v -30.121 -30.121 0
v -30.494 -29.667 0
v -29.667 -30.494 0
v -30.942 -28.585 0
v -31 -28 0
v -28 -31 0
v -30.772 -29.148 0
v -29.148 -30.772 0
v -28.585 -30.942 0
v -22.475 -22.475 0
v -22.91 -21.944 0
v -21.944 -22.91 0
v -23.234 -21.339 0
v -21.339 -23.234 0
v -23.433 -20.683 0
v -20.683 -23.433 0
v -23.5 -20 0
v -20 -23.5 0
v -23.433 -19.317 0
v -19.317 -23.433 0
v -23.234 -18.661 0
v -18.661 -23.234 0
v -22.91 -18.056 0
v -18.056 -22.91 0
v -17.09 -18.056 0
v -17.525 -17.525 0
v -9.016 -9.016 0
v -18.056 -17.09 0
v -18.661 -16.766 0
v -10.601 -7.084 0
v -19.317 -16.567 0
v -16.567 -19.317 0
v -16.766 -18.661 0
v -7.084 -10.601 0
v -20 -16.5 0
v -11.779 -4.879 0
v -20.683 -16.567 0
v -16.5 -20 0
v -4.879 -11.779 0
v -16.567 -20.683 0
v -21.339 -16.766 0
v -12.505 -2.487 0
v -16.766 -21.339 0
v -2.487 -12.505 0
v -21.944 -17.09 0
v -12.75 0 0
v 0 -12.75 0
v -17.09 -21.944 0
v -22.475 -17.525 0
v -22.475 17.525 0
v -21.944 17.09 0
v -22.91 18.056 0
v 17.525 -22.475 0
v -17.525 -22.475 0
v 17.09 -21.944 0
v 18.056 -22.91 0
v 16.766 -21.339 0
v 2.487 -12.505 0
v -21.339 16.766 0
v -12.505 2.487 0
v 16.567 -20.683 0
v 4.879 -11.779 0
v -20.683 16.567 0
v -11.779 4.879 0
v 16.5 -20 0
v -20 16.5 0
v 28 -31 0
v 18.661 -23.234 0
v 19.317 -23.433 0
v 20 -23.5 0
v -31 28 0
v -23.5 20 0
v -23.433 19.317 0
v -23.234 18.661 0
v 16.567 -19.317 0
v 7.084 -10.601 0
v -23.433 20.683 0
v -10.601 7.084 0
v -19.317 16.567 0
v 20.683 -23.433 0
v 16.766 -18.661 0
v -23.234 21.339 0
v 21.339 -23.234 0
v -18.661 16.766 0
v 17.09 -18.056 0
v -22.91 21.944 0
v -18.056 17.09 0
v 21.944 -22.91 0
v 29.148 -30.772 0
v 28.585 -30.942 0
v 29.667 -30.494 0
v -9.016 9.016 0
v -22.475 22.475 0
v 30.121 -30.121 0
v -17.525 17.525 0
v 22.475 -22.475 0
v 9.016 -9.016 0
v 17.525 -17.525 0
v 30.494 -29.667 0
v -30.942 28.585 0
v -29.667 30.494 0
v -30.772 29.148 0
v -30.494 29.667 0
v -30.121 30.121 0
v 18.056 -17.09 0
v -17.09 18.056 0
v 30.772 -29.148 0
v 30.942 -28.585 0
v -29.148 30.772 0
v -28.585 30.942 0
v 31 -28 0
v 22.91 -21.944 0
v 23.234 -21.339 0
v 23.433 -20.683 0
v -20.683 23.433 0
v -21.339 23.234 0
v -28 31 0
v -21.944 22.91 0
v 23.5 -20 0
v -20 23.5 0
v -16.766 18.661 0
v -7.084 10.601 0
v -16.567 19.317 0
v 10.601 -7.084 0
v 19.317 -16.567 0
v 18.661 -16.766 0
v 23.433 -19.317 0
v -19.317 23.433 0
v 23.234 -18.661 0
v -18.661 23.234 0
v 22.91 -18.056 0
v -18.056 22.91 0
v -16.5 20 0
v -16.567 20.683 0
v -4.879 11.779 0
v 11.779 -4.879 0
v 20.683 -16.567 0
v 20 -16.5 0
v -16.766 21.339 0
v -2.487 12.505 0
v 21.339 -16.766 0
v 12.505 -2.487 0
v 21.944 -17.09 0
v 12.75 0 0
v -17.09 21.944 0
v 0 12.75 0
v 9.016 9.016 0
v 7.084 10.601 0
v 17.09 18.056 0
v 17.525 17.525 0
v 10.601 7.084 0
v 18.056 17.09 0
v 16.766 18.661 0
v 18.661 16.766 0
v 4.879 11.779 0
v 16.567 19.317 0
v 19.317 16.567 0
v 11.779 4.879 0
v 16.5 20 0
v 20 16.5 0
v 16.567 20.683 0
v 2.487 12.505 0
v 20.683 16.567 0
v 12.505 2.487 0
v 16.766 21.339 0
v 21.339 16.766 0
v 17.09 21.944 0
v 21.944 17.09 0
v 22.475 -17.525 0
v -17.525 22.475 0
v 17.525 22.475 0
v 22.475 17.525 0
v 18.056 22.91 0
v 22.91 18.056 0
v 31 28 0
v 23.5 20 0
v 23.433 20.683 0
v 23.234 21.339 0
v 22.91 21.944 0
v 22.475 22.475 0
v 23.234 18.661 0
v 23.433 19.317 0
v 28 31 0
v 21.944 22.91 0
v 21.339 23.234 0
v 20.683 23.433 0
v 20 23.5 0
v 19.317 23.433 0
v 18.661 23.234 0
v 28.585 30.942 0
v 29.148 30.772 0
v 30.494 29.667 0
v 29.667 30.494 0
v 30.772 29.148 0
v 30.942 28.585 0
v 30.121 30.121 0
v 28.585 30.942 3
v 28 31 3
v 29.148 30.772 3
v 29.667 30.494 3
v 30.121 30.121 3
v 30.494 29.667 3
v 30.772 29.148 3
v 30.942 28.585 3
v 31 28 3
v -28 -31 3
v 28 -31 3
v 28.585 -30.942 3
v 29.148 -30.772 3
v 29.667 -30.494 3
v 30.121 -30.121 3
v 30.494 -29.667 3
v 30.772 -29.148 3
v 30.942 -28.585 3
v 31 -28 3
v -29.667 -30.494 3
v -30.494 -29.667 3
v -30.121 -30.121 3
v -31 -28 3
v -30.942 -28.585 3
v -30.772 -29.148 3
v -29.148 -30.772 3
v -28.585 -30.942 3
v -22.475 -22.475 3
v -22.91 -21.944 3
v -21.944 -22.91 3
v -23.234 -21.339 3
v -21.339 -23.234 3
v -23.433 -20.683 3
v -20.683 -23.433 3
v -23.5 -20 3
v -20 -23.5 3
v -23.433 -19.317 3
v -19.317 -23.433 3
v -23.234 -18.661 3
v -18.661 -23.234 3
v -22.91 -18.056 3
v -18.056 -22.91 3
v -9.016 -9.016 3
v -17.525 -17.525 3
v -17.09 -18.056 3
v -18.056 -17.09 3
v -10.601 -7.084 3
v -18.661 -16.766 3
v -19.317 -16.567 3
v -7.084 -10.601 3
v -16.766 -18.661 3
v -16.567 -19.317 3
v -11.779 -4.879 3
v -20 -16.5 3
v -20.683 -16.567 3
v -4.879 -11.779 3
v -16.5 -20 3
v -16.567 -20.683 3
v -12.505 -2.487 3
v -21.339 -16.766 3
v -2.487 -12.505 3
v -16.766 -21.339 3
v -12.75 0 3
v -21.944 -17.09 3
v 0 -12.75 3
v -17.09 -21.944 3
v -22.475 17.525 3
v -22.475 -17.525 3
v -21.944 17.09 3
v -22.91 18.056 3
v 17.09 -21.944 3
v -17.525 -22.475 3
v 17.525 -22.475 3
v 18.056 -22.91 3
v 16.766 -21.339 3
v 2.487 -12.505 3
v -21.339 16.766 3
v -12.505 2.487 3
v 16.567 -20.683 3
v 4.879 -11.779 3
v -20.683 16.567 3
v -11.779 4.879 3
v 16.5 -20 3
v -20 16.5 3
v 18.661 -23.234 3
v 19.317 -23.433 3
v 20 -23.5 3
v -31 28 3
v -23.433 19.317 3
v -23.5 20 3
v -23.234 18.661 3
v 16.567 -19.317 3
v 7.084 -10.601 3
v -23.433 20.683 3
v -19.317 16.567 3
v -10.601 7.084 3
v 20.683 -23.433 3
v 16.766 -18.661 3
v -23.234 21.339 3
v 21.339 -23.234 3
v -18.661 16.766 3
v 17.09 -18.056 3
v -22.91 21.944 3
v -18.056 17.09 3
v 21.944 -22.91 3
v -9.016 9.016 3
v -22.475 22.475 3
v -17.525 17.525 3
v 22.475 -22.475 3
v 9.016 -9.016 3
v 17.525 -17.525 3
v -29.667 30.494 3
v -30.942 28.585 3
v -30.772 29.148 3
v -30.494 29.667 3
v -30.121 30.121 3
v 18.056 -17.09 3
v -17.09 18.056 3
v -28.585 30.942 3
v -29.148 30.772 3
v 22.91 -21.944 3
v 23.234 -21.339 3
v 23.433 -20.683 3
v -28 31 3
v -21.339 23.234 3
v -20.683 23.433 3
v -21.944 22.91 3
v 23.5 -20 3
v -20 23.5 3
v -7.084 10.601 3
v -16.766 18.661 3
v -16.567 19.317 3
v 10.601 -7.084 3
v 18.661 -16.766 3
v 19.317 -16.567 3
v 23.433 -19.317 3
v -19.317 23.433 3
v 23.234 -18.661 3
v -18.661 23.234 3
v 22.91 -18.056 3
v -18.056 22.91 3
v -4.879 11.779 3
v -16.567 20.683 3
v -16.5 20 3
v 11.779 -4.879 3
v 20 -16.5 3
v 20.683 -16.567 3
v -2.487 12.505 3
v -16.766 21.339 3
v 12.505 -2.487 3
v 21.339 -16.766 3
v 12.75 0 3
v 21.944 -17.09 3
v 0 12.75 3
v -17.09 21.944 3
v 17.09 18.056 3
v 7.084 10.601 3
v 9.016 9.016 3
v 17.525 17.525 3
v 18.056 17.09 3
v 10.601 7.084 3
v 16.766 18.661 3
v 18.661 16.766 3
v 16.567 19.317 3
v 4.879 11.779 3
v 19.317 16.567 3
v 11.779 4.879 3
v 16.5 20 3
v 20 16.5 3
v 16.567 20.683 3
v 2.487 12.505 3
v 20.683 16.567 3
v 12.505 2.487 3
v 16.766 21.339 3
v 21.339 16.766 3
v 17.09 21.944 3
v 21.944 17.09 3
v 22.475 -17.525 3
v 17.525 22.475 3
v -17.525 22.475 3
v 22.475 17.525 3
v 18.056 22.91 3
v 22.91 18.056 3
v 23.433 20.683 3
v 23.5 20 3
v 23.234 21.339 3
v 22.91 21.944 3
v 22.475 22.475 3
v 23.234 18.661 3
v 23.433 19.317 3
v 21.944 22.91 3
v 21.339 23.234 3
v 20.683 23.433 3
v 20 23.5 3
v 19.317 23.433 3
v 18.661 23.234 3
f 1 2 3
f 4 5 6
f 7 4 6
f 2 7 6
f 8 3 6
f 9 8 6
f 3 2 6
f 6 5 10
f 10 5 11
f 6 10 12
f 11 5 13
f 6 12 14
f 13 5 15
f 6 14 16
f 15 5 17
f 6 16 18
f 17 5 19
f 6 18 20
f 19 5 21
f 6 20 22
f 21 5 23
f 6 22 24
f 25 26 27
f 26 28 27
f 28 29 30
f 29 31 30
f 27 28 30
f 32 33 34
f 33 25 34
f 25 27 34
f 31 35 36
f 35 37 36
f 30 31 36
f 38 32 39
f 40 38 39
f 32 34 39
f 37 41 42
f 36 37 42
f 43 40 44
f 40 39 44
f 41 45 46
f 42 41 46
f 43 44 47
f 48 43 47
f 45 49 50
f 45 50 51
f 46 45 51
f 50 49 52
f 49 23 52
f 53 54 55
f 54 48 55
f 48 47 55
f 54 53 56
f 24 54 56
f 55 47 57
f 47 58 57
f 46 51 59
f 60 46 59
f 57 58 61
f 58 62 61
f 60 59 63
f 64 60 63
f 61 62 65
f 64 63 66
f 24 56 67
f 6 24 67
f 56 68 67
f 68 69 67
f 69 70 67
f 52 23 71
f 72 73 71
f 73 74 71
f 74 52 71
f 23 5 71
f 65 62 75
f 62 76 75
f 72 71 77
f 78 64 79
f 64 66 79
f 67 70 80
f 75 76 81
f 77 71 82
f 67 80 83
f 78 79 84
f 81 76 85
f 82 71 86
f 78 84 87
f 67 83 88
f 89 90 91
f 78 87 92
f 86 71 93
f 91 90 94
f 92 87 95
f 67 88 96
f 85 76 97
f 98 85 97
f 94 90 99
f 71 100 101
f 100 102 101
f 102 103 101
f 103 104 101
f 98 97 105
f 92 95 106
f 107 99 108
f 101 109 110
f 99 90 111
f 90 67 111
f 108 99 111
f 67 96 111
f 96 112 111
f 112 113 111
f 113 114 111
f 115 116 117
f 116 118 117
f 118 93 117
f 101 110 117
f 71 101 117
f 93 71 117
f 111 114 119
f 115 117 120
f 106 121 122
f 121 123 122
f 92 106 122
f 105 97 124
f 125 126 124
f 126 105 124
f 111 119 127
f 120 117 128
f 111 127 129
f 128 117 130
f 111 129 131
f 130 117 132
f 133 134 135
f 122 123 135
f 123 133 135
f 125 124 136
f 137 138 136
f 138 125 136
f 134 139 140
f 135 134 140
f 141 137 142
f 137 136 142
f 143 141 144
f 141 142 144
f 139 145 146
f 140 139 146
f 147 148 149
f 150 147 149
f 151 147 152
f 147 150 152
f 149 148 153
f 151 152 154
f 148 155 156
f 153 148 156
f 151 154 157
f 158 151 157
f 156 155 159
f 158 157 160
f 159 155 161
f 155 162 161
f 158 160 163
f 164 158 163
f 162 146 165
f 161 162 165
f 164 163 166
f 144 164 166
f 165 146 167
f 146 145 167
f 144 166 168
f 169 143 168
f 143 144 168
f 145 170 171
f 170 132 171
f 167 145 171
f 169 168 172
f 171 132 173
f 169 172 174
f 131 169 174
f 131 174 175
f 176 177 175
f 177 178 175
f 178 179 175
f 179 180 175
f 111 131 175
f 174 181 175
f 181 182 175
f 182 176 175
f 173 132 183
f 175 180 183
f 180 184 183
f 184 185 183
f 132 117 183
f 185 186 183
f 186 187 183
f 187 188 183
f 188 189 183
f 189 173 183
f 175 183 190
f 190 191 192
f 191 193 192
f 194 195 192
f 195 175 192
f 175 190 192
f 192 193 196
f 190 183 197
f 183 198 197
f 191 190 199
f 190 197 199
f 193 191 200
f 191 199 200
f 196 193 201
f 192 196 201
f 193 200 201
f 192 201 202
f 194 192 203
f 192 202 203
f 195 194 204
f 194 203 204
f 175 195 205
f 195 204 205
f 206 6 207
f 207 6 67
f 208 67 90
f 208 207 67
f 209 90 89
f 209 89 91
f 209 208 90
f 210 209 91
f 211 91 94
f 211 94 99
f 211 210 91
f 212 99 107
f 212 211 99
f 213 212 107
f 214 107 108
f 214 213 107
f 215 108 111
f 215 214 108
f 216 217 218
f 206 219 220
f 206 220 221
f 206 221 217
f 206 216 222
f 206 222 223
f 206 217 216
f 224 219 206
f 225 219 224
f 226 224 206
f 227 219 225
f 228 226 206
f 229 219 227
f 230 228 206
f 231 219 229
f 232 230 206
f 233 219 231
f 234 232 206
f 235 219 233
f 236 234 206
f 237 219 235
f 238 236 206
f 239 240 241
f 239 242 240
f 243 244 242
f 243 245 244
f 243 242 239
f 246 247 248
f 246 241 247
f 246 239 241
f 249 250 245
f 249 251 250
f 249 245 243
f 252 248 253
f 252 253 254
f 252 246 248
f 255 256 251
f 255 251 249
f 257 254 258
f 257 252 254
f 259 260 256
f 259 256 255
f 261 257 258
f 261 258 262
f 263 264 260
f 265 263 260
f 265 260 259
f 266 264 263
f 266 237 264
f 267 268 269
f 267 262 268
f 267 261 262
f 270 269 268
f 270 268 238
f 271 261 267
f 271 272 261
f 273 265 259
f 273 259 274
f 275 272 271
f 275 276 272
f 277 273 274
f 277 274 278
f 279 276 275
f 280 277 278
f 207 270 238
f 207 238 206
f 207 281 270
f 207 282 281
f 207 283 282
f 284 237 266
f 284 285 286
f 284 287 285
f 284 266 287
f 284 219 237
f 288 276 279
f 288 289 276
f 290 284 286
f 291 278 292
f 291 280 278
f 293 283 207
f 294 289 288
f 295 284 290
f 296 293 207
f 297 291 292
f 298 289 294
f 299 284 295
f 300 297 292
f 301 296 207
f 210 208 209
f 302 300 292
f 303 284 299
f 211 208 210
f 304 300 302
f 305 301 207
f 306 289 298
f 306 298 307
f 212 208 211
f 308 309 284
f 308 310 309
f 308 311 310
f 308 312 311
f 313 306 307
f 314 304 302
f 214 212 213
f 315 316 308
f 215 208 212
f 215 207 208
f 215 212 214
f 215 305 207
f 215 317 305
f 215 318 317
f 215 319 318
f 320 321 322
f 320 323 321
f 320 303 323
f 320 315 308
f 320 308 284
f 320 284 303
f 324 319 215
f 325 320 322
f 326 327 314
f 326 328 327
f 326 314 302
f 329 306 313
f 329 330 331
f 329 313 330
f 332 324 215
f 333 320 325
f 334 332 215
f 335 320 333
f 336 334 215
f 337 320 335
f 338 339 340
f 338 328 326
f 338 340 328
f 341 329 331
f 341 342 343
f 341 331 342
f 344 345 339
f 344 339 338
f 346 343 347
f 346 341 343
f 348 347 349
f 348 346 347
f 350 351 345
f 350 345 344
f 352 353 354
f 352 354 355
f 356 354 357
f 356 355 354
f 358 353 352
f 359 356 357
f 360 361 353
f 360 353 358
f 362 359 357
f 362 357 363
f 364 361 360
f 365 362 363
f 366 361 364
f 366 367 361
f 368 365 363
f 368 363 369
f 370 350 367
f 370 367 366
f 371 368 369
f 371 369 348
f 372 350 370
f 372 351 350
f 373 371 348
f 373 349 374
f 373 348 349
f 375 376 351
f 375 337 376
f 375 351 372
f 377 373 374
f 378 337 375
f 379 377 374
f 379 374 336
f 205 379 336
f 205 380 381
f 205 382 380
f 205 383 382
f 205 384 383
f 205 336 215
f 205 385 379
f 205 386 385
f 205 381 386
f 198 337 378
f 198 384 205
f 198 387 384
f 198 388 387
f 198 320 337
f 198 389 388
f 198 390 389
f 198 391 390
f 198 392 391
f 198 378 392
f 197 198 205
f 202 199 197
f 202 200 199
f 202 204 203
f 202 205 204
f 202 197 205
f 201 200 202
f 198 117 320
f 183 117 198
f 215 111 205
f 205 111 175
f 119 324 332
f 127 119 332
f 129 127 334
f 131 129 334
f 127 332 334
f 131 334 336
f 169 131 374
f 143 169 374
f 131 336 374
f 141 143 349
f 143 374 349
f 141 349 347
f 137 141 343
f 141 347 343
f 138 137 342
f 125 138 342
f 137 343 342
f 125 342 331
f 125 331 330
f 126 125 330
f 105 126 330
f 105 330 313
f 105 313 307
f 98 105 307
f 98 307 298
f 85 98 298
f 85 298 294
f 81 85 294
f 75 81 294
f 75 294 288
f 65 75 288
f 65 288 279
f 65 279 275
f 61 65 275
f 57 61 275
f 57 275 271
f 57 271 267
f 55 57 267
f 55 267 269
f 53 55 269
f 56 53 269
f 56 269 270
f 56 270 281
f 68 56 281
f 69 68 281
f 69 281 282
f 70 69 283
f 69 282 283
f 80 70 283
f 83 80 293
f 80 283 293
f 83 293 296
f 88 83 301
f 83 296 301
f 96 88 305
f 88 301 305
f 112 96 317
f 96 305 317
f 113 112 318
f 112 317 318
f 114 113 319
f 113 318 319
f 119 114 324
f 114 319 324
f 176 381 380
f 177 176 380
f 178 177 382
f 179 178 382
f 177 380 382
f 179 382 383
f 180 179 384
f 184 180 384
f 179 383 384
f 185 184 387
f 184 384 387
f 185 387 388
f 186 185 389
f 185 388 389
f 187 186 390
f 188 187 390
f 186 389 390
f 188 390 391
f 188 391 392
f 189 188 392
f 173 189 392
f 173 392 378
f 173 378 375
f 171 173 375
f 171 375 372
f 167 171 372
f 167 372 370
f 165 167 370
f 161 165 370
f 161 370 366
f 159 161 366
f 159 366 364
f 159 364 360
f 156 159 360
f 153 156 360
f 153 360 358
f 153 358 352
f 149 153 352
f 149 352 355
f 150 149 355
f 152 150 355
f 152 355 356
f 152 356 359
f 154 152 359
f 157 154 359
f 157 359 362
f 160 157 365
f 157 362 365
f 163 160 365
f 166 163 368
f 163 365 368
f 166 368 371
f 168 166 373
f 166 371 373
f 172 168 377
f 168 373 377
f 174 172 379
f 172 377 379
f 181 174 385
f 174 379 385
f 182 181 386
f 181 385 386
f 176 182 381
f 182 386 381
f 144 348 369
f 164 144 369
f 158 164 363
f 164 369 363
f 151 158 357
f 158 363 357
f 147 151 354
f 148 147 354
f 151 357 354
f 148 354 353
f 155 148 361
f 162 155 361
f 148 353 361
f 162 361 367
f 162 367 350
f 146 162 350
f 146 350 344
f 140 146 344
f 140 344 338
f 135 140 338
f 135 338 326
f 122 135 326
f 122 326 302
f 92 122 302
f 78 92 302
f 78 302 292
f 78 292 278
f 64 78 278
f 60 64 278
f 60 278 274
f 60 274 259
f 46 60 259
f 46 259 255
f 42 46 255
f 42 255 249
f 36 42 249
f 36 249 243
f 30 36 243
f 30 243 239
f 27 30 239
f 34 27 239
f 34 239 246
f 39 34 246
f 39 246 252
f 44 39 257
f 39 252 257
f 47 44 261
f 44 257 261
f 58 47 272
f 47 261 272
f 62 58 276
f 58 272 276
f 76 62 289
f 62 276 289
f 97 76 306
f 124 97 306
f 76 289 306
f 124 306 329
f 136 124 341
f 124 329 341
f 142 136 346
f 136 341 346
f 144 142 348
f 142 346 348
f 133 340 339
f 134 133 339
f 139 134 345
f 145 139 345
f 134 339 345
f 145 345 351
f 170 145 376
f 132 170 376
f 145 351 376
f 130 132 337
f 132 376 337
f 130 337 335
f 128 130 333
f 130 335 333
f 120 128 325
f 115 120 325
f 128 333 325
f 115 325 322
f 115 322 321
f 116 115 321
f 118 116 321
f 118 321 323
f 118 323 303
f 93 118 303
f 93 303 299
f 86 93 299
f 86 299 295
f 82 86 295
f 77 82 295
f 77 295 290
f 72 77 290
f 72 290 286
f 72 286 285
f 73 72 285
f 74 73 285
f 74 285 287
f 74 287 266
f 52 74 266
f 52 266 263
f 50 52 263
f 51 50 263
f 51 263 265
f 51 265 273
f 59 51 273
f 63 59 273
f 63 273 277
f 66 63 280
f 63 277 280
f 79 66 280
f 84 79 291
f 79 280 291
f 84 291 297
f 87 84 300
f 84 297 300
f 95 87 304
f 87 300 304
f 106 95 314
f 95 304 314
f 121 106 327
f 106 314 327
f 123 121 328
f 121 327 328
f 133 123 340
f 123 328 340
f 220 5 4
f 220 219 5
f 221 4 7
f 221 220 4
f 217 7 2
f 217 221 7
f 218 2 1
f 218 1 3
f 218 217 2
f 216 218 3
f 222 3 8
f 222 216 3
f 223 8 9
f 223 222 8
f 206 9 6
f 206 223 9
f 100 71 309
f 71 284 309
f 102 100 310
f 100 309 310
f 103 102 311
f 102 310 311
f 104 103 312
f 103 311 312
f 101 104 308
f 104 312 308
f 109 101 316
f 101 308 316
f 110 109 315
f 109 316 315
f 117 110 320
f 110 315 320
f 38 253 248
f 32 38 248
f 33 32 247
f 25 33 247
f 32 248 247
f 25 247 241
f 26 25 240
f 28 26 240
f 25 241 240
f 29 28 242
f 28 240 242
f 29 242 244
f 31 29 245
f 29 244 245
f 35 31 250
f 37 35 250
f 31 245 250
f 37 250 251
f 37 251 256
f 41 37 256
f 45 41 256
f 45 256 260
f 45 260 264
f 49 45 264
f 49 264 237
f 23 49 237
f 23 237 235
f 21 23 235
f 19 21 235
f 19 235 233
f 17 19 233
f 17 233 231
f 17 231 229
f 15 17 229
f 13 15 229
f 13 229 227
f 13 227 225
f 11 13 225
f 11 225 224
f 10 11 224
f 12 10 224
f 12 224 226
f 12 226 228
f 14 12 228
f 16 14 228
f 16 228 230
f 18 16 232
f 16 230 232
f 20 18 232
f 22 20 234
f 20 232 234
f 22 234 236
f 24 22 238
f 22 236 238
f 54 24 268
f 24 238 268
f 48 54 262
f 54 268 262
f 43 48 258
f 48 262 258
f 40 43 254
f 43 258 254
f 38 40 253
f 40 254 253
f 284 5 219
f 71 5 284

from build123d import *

# Parameters (mm, degrees)
F0_W     = 62
F0_H     = 62
F1_DEPTH = 3
F2_R     = 3.5
F2_R_2   = 12.75
F3_DEPTH = 25
F4_R     = 3


with BuildPart() as f1:
    # F0 (on Top) → F1 (new body)
    with BuildSketch(Plane.XY):
        Rectangle(F0_W, F0_H)
    extrude(amount=F1_DEPTH)

    # F2 (on face) → F3 (cut)
    with BuildSketch(Plane.XY.offset(3)):
        with Locations((-20, 20)):
            Circle(F2_R)
        with Locations((20, 20)):
            Circle(F2_R)
        with Locations((20, -20)):
            Circle(F2_R)
        with Locations((-20, -20)):
            Circle(F2_R)
        Circle(F2_R_2)
    extrude(amount=-F3_DEPTH, mode=Mode.SUBTRACT)

    # F4
    f4_edges = [f1.edges().sort_by_distance(p)[0] for p in [
        (-31, 31, 1.5),
        (31, 31, 1.5),
        (-31, -31, 1.5),
        (31, -31, 1.5),
    ]]
    fillet(f4_edges, radius=F4_R)


solid = f1.part
